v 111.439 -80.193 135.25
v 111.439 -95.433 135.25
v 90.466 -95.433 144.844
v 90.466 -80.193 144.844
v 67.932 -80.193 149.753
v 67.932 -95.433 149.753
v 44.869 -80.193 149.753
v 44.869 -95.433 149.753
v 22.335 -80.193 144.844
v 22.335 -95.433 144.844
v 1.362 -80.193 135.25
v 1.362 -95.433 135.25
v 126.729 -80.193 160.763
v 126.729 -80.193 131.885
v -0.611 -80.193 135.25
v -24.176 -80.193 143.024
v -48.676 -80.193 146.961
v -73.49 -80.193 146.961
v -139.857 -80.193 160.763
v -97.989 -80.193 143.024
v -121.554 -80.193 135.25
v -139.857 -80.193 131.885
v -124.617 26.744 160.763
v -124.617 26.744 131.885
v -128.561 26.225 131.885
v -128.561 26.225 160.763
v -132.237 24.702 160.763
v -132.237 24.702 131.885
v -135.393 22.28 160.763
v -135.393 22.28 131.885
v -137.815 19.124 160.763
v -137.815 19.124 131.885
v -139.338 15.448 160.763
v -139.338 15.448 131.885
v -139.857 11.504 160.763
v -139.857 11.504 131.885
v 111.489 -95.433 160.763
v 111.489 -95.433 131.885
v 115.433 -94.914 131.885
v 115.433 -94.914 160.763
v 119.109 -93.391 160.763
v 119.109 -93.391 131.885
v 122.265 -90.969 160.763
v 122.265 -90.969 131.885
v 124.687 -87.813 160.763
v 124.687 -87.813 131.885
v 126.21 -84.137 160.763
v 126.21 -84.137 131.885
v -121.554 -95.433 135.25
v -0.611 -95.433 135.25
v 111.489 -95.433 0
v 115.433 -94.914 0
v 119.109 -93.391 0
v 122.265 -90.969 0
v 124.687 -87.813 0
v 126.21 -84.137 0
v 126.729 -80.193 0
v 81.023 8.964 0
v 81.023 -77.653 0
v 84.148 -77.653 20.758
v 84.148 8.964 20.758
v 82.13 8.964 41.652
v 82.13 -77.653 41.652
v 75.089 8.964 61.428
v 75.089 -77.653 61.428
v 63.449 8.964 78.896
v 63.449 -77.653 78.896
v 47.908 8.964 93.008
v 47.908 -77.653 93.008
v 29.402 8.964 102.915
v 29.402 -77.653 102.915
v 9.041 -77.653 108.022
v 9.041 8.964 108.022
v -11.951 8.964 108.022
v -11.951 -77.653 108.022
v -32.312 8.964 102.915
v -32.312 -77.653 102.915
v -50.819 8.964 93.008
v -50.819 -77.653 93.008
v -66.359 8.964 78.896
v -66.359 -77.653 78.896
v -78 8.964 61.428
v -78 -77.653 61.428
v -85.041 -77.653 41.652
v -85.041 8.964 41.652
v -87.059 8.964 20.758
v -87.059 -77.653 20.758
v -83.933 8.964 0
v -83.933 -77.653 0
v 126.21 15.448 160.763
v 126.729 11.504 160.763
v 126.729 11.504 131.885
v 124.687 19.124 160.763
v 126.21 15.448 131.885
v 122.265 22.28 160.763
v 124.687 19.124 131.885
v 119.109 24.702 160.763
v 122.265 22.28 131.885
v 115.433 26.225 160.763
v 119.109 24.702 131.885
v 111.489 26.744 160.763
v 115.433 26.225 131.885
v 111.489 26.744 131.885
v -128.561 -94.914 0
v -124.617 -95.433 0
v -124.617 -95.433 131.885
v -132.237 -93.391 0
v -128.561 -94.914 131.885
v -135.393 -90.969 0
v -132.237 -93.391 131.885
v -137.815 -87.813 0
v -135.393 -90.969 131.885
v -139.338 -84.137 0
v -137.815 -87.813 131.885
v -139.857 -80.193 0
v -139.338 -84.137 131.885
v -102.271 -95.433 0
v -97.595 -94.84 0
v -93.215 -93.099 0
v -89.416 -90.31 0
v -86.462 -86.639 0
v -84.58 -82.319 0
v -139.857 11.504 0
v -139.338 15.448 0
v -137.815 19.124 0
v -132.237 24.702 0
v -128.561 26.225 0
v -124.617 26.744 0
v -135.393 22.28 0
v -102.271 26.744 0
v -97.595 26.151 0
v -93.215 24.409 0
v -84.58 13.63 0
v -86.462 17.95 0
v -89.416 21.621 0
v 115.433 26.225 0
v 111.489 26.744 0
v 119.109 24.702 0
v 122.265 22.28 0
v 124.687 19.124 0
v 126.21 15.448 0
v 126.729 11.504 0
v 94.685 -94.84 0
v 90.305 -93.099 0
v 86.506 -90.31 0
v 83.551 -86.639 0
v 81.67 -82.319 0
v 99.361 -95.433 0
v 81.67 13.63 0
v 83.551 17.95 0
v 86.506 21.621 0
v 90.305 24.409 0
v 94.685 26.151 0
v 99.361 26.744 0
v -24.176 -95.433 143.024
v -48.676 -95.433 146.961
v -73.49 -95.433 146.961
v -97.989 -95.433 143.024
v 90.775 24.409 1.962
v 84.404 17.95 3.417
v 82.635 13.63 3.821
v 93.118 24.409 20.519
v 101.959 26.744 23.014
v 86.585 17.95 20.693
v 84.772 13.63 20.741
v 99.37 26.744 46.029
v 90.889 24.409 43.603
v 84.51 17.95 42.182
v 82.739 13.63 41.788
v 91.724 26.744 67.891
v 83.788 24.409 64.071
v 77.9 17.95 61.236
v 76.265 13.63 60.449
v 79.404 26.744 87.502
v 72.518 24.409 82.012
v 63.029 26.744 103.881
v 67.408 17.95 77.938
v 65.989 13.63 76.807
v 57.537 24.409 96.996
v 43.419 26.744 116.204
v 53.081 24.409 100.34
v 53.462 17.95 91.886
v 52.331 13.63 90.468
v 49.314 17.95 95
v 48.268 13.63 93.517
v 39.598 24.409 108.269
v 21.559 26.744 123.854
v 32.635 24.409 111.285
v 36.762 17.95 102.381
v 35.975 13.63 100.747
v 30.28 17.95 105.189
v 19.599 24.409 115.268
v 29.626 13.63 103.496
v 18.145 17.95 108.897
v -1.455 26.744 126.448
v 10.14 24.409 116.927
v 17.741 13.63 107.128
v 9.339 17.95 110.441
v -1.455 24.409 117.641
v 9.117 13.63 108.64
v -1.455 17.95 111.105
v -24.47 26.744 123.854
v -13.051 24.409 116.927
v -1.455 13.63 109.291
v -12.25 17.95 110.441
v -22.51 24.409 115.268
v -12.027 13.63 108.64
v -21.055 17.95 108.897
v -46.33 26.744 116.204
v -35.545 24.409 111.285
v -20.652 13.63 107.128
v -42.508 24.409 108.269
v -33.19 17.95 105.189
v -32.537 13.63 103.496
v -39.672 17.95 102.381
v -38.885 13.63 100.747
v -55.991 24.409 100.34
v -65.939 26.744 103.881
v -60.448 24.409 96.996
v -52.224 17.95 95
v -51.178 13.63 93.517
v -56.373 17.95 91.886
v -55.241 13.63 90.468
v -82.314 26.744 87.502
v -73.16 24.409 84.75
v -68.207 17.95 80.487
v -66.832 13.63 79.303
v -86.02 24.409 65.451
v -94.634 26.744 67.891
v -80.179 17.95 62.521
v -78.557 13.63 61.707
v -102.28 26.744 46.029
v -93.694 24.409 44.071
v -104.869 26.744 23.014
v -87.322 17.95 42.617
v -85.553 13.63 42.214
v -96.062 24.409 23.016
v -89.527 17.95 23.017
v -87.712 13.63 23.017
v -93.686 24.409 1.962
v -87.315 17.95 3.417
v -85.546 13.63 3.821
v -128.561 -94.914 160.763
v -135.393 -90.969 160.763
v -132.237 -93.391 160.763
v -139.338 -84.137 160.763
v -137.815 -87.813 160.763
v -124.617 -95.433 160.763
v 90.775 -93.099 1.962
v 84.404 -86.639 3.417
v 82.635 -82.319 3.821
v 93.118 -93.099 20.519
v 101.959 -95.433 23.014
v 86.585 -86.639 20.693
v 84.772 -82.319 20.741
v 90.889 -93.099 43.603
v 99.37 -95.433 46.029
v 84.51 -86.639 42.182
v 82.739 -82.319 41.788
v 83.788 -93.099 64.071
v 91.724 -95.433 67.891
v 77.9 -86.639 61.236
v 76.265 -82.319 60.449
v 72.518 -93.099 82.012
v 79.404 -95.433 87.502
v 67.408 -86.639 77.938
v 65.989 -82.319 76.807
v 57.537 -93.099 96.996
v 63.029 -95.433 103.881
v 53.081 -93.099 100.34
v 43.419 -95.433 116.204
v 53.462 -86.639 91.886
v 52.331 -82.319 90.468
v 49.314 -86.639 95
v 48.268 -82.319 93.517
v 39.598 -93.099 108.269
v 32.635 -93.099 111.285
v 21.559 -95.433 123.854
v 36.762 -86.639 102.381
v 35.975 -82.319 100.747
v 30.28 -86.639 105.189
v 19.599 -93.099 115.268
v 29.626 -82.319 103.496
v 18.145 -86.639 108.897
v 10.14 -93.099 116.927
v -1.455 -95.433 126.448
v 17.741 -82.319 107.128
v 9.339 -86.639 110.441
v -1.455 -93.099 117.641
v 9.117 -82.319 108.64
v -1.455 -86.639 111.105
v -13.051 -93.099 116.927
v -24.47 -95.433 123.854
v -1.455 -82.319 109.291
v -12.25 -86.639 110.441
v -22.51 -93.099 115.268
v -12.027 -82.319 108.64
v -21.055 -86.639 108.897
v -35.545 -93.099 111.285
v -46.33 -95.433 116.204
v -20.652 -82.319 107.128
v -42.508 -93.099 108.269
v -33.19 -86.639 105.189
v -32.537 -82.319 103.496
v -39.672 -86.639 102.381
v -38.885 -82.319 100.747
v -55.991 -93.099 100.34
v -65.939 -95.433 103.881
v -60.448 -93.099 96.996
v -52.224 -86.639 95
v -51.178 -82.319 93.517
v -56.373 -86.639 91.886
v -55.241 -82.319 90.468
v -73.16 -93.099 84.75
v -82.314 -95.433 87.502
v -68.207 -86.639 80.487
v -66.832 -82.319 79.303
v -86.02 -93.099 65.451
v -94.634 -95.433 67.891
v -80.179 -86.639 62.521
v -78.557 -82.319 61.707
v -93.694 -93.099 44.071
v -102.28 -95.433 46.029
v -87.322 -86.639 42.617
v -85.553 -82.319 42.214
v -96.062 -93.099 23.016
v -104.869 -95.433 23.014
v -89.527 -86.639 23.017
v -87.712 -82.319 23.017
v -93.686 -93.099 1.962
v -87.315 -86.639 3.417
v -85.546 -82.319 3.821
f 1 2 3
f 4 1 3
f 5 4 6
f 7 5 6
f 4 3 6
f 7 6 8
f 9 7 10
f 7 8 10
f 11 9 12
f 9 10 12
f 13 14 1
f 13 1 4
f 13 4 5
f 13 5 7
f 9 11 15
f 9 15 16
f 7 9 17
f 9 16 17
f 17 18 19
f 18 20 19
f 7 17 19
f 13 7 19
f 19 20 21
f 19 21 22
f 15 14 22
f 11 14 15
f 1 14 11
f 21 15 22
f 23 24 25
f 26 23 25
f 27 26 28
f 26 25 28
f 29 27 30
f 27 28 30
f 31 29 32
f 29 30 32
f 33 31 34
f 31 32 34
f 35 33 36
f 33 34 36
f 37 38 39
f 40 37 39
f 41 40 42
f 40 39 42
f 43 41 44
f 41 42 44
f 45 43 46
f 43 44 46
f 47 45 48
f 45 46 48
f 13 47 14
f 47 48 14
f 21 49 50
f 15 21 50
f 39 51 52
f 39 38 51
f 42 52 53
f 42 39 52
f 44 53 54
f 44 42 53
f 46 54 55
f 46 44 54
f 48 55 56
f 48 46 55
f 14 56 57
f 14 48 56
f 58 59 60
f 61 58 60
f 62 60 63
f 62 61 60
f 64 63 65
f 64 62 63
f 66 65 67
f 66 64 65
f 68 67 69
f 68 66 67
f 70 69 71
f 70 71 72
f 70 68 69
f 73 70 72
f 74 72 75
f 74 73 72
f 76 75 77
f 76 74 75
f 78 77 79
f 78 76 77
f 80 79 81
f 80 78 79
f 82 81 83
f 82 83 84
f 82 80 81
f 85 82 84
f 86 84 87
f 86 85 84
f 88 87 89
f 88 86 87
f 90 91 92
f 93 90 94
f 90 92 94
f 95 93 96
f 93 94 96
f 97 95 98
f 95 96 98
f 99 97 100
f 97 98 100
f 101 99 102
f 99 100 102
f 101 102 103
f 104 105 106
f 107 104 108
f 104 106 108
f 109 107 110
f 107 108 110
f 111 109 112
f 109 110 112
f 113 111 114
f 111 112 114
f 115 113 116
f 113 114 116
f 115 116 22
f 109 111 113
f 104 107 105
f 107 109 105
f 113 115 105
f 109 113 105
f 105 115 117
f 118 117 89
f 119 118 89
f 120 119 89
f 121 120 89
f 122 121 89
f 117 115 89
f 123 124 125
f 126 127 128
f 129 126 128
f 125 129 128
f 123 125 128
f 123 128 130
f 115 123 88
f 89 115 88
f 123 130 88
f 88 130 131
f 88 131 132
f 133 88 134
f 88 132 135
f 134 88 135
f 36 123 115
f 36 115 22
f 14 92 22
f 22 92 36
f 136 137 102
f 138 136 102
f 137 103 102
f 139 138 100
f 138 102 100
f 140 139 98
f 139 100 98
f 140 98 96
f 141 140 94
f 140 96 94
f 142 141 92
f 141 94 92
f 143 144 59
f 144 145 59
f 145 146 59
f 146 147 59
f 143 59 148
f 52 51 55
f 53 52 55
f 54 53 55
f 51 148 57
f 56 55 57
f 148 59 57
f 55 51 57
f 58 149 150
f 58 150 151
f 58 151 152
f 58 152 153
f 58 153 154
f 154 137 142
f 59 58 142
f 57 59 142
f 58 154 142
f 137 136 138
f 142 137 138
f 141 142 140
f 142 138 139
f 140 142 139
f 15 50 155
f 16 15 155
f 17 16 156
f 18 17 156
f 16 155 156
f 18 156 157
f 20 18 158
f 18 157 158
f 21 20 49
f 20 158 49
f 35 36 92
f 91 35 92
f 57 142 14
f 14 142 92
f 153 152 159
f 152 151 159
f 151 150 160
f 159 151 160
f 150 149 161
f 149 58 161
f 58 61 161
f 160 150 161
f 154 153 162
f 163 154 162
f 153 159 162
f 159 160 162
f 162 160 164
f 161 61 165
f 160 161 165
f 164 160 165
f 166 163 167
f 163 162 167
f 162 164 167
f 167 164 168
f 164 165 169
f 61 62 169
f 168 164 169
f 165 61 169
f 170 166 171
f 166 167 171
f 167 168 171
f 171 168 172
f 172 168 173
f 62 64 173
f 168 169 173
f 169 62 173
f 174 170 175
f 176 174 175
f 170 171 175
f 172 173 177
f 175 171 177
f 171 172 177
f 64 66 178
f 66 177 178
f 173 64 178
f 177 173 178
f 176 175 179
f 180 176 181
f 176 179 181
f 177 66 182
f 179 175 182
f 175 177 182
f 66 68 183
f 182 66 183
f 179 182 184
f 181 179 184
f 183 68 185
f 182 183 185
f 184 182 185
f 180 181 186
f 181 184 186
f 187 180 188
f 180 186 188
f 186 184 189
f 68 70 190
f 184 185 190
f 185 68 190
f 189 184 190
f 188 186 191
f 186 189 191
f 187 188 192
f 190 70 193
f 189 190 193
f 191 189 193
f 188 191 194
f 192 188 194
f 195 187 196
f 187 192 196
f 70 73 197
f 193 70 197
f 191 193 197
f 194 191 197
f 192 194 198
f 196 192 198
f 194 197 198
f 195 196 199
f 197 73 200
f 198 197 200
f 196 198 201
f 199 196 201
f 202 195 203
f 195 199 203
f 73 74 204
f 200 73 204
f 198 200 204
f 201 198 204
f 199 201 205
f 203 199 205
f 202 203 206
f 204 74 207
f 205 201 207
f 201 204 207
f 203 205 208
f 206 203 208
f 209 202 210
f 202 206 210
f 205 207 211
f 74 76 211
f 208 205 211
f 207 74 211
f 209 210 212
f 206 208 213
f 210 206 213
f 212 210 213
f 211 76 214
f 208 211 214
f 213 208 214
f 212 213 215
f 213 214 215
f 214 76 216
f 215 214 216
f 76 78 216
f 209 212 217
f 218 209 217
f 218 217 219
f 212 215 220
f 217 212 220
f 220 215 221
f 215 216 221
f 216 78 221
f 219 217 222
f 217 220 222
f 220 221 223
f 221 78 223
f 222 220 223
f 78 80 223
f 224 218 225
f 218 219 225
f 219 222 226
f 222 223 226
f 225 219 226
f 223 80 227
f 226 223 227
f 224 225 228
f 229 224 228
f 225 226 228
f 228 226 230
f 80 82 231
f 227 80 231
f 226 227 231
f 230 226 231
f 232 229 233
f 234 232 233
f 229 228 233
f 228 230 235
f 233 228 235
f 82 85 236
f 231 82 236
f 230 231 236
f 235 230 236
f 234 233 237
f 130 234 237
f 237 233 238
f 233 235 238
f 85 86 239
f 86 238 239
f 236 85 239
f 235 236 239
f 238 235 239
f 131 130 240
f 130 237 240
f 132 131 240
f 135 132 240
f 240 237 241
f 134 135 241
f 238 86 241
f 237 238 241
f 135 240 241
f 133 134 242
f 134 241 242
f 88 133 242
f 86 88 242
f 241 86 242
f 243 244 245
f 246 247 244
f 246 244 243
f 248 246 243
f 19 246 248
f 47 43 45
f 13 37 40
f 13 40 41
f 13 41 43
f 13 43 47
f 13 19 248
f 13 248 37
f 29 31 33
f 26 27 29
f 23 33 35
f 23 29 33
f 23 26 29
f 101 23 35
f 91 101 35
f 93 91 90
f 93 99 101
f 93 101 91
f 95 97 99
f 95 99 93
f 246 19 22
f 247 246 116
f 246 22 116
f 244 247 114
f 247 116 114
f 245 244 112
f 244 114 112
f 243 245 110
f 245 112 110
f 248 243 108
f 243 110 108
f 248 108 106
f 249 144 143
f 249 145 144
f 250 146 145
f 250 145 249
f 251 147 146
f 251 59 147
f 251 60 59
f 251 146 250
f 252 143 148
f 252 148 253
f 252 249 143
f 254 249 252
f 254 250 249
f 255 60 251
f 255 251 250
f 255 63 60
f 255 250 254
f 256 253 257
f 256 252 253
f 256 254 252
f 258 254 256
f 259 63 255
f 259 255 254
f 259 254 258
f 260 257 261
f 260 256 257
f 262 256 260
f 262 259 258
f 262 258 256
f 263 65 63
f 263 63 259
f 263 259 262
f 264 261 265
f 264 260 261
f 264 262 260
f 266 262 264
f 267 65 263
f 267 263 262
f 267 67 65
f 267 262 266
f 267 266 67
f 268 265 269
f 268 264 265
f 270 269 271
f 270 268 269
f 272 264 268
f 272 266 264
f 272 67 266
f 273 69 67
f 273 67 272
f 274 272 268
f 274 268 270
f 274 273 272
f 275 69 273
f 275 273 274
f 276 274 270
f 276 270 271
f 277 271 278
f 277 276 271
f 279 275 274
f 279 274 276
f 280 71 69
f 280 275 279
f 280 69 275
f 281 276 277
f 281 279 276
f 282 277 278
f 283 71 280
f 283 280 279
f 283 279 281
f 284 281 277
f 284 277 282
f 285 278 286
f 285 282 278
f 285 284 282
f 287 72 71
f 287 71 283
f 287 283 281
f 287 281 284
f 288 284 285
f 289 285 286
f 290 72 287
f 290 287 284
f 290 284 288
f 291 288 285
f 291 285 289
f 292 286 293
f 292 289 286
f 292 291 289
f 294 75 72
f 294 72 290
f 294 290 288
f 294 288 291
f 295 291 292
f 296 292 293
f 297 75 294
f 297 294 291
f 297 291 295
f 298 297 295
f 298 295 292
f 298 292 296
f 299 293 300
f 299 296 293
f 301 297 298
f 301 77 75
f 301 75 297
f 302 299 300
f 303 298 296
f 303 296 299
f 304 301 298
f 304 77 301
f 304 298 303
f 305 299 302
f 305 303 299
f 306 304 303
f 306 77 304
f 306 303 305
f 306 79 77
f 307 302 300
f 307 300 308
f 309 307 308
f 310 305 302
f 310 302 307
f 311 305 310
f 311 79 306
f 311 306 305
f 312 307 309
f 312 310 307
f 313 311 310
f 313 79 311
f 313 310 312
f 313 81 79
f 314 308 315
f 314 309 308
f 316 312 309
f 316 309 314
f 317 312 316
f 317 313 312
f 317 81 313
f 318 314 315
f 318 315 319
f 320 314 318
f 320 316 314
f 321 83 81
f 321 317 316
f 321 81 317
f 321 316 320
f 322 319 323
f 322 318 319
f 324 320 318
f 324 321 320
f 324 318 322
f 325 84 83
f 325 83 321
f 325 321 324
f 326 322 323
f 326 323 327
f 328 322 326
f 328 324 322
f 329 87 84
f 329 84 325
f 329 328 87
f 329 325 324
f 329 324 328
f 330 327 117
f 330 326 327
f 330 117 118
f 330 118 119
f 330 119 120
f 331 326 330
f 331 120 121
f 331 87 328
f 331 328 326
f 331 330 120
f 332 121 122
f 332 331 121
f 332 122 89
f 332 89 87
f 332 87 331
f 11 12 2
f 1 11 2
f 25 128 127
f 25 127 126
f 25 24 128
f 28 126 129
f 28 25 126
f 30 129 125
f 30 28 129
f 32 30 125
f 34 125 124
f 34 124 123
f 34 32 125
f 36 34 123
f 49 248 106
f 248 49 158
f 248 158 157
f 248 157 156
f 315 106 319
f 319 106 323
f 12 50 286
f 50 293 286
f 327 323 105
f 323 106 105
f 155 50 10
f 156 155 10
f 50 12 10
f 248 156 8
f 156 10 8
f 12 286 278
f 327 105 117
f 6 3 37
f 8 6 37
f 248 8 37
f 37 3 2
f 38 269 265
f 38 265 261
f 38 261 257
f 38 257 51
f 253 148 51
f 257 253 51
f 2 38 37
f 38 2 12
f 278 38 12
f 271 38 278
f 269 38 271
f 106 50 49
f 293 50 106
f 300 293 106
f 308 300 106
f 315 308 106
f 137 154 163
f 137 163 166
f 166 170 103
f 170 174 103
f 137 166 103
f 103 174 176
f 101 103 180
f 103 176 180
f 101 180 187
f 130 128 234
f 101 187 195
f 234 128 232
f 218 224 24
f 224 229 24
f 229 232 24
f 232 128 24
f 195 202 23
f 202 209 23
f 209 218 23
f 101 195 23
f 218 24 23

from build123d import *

# Parameters (mm, degrees)
F0_W      = 140.1769816875
F0_H      = 53.487598896
F13_DEPTH = 131.8847630173
F1_DEPTH  = 69.7684045881
F2_DEPTH  = 56.6403288394
F14_DEPTH = 101.1081095785
F15_DEPTH = 68.6891395599
F4_R      = 17.78
F5_R      = 15.24
F6_DEPTH  = 28.8777854294
F10_DEPTH = 25.4
F12_DEPTH = 25.4


with BuildPart() as f13:
    # F0 (on Top) → F13 (new body)
    with BuildSketch(Plane.XY):
        Rectangle(F0_W, F0_H)
    extrude(amount=F13_DEPTH)

    # F1 (add): a face of the model
    f1_faces = [f13.faces().sort_by_distance(p)[0] for p in [
        (-70.0884908438, 0, 65.9423815086),
    ]]
    extrude(f1_faces, amount=F1_DEPTH)

    # F2 (add): a face of the model
    f2_faces = [f13.faces().sort_by_distance(p)[0] for p in [
        (70.0884908438, 0, 65.9423815086),
    ]]
    extrude(f2_faces, amount=F2_DEPTH)

    # F3 (on face) → F14 (cut)
    with BuildSketch(Plane.XZ.offset(26.743799448)):
        with BuildLine():
            Line((-83.9332714677, 0), (81.0228064656, 0))
            ThreePointArc((81.0228064656, 0), (-1.455232501, 108.6675575463), (-83.9332714677, 0))
        make_face()
    extrude(amount=-F14_DEPTH, mode=Mode.SUBTRACT)

    # F15 (add): a face of the model
    f15_faces = [f13.faces().sort_by_distance(p)[0] for p in [
        (-111.8950834498, -26.743799448, 2.9742483793),
    ]]
    extrude(f15_faces, amount=F15_DEPTH)

    # F4
    f4_edges = [f13.edges().sort_by_distance(p)[0] for p in [
        (-1.455233, 26.743799, 108.667558),
        (-1.455233, -95.432939, 108.667558),
    ]]
    fillet(f4_edges, radius=F4_R)

    # F5
    f5_edges = [f13.edges().sort_by_distance(p)[0] for p in [
        (126.72882, -95.432939, 65.942382),
        (126.72882, 26.743799, 65.942382),
        (-139.856895, -95.432939, 65.942382),
        (-139.856895, 26.743799, 65.942382),
    ]]
    fillet(f5_edges, radius=F5_R)

    # F16 (on face) → F6 (join)
    with BuildSketch(Plane.XY.offset(131.8847630173)):
        with BuildLine():
            ThreePointArc((111.4888196832, -95.4329390079), (122.2651270285, -90.9692463532), (126.7288196832, -80.1929390079))
            Line((126.7288196832, -80.1929390079), (-139.8568954319, -80.1929390079))
            ThreePointArc((-139.8568954319, -80.1929390079), (-135.3932027772, -90.9692463532), (-124.6168954319, -95.4329390079))
            Line((-124.6168954319, -95.4329390079), (111.4888196832, -95.4329390079))
        make_face()
        with BuildLine():
            Line((-139.8568954319, 11.503799448), (126.7288196832, 11.503799448))
            ThreePointArc((126.7288196832, 11.503799448), (122.2651270285, 22.2801067933), (111.4888196832, 26.743799448))
            Line((111.4888196832, 26.743799448), (-124.6168954319, 26.743799448))
            ThreePointArc((-124.6168954319, 26.743799448), (-135.3932027772, 22.2801067933), (-139.8568954319, 11.503799448))
        make_face()
    extrude(amount=F6_DEPTH)

    # F9 (on face) → F10 (cut)
    with BuildSketch(Plane.XZ.offset(95.4329390079)):
        with BuildLine():
            Line((-39.3435060978, 135.2504938841), (-0.6112582661, 135.2504938841))
            ThreePointArc((-0.6112582661, 135.2504938841), (-61.0826207458, 147.45574623), (-121.5539832255, 135.2504938841))
            Line((-121.5539832255, 135.2504938841), (-39.3435060978, 135.2504938841))
        make_face()
    extrude(amount=-F10_DEPTH, mode=Mode.SUBTRACT)

    # F11 (on face) → F12 (cut)
    with BuildSketch(Plane.XZ.offset(95.4329390079)):
        with BuildLine():
            Line((9.9441353232, 135.2504938841), (111.4393852922, 135.2504938841))
            ThreePointArc((111.4393852922, 135.2504938841), (56.4007480003, 150.371931024), (1.3621107084, 135.2504938841))
            Line((1.3621107084, 135.2504938841), (9.9441353232, 135.2504938841))
        make_face()
    extrude(amount=-F12_DEPTH, mode=Mode.SUBTRACT)


solid = f13.part
